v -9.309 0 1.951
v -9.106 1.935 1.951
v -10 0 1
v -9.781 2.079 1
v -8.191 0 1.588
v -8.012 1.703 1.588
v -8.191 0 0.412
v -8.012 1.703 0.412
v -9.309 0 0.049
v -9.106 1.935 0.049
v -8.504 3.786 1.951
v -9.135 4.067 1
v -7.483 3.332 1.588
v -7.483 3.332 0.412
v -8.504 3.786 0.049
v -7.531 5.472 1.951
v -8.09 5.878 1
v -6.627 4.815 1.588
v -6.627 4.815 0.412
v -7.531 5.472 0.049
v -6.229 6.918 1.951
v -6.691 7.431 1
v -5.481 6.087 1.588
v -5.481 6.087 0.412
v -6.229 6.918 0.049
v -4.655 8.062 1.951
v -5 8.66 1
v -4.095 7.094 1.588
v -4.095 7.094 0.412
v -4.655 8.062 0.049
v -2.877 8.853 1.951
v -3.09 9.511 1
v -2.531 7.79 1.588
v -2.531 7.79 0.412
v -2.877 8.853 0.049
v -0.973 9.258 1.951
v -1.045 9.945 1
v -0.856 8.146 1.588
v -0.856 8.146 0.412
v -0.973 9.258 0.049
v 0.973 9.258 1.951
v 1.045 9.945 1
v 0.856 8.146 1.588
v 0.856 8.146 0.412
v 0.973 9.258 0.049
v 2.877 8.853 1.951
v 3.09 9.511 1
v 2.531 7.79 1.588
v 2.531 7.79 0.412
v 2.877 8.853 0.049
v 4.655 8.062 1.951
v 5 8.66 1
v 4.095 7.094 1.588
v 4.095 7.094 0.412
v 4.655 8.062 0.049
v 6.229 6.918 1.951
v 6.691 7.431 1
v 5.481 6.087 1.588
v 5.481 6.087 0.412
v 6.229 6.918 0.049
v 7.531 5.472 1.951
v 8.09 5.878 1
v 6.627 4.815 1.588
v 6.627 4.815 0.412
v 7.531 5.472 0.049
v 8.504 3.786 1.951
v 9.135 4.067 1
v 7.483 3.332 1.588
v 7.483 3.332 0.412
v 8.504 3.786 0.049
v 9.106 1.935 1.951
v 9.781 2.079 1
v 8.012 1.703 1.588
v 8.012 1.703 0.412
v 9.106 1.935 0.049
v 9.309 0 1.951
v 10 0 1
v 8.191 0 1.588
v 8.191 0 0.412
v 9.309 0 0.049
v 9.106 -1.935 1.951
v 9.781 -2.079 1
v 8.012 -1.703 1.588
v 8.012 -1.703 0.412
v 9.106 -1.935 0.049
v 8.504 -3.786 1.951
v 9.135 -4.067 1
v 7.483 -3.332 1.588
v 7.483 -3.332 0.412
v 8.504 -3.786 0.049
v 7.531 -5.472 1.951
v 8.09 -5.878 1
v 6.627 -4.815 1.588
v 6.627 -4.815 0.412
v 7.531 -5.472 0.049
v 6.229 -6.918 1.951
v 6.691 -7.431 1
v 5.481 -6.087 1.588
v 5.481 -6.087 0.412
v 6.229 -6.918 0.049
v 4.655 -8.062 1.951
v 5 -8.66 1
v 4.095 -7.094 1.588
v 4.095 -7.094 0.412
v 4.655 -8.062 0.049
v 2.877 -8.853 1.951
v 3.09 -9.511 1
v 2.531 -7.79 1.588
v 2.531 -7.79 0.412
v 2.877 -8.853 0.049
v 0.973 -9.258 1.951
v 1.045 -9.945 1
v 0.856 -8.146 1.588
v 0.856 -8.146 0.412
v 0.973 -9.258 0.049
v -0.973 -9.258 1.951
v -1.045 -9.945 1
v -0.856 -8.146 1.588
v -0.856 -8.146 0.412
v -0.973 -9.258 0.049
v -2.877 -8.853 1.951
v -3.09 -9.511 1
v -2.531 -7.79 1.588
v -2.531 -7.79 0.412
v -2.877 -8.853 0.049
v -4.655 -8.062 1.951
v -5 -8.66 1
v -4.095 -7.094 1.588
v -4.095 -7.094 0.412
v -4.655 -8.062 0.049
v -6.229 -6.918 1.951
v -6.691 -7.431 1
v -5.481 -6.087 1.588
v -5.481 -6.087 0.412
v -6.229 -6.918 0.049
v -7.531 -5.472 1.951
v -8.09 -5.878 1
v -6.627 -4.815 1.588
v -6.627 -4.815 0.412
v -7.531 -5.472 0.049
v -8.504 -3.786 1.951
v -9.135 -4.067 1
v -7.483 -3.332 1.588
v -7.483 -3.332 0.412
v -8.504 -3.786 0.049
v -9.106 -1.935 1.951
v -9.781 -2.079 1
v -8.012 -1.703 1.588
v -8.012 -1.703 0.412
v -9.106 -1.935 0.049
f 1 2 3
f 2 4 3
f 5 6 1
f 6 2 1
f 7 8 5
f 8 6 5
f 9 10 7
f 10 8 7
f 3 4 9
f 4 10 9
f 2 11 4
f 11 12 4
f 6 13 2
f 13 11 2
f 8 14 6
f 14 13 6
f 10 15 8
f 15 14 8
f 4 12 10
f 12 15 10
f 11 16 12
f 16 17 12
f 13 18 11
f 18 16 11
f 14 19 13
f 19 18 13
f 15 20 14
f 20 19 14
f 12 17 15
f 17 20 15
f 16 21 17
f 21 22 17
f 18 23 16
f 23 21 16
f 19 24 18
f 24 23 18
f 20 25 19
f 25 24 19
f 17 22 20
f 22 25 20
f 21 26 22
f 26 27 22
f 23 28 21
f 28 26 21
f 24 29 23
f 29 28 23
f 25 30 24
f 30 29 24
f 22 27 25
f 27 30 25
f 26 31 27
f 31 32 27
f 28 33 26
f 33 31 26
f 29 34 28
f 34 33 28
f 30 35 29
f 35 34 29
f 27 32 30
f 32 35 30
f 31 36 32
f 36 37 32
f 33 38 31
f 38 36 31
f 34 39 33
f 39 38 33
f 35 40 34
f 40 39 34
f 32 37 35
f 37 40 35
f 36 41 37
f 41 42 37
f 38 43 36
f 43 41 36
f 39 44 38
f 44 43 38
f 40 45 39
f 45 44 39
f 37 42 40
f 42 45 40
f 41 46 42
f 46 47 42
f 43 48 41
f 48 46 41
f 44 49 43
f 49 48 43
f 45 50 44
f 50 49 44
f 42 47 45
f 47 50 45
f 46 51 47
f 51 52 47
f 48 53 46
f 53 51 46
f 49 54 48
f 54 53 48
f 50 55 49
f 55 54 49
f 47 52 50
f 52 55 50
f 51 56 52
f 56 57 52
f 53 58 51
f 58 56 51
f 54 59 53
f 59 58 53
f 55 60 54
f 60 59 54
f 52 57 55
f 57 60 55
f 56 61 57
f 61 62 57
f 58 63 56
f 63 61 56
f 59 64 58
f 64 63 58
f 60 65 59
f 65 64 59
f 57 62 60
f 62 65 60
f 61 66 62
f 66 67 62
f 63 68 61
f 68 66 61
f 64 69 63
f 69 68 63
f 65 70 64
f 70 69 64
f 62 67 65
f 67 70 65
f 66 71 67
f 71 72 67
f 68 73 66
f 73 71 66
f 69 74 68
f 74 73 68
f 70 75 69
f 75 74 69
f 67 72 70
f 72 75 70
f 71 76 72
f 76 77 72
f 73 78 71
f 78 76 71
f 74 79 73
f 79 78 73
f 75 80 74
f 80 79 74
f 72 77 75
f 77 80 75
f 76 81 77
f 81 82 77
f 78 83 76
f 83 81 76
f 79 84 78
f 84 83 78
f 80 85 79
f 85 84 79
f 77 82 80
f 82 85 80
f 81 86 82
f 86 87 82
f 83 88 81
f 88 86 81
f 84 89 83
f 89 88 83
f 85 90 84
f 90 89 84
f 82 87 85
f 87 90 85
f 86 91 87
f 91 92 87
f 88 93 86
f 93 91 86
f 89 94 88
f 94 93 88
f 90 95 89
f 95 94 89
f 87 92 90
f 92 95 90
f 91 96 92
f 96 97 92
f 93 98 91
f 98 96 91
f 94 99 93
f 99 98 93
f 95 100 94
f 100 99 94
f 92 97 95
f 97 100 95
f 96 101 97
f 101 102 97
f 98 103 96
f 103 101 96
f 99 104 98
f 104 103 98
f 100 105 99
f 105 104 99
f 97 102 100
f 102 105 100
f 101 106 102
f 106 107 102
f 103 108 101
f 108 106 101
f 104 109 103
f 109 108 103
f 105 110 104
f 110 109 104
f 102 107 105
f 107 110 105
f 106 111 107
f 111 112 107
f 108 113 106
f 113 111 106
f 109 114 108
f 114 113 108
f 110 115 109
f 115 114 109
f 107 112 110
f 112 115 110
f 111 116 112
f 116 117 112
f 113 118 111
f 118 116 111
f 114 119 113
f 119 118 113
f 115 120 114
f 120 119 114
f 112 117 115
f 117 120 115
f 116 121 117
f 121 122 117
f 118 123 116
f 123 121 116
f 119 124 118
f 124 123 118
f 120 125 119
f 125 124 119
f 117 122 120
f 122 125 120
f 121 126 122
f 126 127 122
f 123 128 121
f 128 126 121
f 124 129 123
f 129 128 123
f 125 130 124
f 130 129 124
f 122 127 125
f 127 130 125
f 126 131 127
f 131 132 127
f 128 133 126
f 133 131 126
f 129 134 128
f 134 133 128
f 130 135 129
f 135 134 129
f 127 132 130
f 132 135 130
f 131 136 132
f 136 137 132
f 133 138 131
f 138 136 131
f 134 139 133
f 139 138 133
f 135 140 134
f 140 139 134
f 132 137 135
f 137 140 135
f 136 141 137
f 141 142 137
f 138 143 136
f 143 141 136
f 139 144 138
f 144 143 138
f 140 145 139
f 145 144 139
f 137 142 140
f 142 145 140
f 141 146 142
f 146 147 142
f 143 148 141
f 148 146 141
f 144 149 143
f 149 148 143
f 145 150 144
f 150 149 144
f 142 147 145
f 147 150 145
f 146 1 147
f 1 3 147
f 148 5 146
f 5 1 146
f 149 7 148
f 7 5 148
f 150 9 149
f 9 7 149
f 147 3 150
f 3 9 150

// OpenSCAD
torus();

module torus(
    h = 2,     
    r = 10,   
    sides = $fn)
{
    tube_radius = h / 2;
    inside_radius = r - tube_radius;
    //translate([r,r,thickness_radius])
    translate([0,0,tube_radius])
    rotate_extrude()
    translate([inside_radius, 0, 0])
    circle(r = tube_radius, $fn = sides);
}
